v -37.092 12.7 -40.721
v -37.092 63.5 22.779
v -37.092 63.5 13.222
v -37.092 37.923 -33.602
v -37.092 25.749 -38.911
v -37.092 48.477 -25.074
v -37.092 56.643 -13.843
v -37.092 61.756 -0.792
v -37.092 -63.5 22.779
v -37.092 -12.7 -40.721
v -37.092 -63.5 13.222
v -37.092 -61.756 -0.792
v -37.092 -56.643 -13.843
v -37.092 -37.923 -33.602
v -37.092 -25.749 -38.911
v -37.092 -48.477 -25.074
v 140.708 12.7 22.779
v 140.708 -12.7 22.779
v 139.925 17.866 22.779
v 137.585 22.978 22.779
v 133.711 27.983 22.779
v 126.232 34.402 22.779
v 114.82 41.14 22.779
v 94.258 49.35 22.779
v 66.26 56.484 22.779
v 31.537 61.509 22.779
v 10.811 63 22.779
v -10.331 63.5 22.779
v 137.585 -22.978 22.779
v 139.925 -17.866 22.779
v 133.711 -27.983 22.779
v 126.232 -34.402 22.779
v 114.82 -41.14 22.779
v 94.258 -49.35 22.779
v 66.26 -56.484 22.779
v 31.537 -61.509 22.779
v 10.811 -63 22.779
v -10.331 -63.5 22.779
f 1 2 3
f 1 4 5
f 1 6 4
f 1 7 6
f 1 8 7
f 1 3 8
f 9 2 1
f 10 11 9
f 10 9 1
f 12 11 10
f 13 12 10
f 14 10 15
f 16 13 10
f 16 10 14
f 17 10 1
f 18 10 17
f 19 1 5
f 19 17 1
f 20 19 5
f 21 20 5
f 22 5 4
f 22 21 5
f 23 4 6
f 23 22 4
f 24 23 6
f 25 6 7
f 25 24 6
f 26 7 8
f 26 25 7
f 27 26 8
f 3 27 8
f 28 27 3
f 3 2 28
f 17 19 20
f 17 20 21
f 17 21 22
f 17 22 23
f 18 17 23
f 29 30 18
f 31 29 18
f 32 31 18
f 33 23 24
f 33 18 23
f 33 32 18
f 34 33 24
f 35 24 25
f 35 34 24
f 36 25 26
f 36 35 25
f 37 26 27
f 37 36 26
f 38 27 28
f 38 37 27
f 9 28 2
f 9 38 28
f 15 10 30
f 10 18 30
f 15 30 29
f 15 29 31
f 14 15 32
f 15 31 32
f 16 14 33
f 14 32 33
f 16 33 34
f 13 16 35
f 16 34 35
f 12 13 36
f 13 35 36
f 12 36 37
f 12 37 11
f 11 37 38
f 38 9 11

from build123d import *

# Parameters (mm, degrees)
F1_DEPTH = 63.5
F2_R     = 50.8


with BuildPart() as f1:
    # F0 (on Front) → F1 (new body, symmetric)
    with BuildSketch(Plane.XZ):
        Polygon((140.708246, 22.779214), (-37.091754, 22.779214), (-37.091754, -40.720786), align=None)
    extrude(amount=F1_DEPTH, both=True)

    # F2
    f2_edges = [f1.edges().sort_by_distance(p)[0] for p in [
        (51.808246, 63.5, -8.970786),
        (51.808246, -63.5, -8.970786),
    ]]
    fillet(f2_edges, radius=F2_R)


solid = f1.part
